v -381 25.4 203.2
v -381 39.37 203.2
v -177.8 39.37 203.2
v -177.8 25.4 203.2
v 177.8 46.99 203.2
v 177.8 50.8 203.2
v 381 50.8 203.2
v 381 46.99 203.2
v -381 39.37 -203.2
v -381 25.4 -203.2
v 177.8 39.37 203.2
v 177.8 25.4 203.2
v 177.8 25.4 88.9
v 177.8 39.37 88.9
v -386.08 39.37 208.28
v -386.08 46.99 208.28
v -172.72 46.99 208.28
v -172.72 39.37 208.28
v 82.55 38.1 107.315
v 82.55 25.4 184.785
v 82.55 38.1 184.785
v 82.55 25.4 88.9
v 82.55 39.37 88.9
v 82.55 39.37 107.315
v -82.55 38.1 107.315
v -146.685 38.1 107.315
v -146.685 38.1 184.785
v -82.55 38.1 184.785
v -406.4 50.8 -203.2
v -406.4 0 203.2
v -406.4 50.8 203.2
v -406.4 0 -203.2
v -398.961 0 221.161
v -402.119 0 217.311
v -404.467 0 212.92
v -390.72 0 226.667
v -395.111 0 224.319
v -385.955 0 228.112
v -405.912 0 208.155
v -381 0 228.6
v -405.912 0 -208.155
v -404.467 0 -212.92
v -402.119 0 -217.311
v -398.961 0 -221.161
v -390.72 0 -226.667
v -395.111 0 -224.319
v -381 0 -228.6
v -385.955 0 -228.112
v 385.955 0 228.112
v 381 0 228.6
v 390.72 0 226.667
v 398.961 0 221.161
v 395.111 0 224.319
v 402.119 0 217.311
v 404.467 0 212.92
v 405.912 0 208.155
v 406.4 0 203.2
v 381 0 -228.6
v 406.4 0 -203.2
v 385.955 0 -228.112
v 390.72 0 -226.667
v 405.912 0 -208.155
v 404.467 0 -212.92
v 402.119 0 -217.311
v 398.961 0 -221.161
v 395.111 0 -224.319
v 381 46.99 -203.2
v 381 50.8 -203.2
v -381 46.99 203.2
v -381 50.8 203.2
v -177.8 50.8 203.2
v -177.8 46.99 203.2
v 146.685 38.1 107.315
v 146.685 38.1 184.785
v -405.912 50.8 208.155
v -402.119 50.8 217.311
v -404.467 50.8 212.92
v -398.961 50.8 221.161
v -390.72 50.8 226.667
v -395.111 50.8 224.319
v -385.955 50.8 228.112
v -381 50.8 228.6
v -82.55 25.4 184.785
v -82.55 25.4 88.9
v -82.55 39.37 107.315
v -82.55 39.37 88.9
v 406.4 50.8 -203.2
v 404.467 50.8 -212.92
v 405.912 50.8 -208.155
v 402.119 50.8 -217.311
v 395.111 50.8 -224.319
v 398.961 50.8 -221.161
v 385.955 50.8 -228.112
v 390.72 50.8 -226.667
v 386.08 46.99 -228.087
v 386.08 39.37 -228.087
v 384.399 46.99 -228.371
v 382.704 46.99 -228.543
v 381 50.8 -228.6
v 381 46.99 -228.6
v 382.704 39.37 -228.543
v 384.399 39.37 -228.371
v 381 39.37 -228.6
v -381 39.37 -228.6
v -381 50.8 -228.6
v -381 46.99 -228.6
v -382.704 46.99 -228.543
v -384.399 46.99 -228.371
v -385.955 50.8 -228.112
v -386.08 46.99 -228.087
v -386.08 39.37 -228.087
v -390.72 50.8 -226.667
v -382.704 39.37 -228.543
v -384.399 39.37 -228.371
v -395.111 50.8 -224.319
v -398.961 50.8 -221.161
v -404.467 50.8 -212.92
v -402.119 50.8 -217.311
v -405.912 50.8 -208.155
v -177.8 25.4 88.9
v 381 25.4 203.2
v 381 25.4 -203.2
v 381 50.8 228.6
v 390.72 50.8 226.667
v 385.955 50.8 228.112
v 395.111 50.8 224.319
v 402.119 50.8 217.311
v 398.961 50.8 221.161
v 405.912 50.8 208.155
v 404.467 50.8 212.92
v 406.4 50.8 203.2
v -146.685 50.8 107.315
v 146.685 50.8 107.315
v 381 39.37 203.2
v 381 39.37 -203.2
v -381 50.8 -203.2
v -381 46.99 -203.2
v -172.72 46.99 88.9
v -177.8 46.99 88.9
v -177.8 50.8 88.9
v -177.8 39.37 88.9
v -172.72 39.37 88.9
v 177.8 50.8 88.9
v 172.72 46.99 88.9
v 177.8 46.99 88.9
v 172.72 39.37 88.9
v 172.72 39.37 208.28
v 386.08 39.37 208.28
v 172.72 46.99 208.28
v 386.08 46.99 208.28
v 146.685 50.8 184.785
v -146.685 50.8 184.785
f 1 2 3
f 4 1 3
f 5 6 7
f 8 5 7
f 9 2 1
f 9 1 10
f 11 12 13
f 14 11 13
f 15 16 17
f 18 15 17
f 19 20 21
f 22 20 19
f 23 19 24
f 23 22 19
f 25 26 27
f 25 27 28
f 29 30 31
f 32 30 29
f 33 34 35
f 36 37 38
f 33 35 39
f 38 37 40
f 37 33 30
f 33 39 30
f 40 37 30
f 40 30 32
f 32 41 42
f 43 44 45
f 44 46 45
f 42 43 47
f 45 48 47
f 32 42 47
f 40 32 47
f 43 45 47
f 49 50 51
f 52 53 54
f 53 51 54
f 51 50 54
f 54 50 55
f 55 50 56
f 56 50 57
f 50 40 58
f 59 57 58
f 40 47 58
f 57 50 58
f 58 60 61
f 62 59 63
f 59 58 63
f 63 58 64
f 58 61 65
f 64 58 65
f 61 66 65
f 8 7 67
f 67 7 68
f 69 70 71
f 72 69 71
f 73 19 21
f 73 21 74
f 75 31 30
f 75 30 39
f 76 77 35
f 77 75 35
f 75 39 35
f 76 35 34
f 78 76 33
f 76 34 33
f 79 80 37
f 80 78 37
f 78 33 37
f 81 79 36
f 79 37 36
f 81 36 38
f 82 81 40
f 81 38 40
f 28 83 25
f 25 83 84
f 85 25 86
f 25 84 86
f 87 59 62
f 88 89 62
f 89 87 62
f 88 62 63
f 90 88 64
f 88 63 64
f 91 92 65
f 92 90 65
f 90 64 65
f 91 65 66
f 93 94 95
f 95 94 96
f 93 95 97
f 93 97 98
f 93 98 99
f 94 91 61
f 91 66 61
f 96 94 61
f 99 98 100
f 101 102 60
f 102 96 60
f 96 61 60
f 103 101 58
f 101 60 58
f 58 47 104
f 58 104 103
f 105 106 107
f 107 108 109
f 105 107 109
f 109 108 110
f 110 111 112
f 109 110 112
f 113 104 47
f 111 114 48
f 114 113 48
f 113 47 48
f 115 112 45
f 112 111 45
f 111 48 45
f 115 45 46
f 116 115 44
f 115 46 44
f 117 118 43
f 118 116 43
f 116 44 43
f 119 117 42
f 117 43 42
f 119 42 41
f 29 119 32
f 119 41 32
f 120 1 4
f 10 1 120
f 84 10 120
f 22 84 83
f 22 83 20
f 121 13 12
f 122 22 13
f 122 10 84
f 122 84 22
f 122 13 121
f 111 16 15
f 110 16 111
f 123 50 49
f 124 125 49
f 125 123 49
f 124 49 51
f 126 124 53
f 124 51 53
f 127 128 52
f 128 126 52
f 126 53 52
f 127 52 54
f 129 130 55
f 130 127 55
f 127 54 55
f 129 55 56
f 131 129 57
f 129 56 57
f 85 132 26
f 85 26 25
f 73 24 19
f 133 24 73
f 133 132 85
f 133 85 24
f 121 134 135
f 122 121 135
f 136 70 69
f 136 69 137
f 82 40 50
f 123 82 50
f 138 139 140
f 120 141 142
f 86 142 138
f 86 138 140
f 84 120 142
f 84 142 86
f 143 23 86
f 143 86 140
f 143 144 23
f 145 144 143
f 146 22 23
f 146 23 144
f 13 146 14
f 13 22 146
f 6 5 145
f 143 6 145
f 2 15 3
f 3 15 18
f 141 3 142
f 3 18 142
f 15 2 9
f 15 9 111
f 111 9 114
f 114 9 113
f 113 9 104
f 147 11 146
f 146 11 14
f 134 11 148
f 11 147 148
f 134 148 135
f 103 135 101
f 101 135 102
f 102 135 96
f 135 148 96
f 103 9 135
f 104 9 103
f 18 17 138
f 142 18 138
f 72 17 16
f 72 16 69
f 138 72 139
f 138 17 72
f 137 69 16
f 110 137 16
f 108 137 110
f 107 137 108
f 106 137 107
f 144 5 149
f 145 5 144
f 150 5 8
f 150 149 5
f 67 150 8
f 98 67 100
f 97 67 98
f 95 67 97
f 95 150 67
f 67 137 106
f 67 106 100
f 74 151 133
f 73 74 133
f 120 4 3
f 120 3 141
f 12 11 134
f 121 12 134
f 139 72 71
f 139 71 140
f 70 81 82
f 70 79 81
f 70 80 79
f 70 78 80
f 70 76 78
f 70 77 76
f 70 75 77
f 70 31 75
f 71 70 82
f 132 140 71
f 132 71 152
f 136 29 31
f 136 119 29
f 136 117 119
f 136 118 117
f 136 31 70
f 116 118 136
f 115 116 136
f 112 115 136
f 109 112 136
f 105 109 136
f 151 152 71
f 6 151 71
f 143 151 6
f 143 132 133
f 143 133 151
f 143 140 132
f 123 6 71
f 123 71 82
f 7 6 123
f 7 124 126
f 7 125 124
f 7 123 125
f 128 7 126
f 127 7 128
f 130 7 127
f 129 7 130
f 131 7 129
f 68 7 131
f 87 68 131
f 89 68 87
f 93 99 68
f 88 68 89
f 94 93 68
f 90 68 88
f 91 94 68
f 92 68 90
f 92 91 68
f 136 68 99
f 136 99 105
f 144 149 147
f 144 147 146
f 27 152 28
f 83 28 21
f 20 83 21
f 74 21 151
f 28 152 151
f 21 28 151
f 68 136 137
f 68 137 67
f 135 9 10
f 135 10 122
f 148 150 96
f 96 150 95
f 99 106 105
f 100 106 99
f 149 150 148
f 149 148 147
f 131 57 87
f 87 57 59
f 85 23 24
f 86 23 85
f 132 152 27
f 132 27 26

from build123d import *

# Parameters (mm, degrees)
SKETCH3_W                       = 812.8
SKETCH3_H                       = 457.2
BOSS_EXTRUDE3_DEPTH             = 50.8
SKETCH7_W                       = 762
SKETCH7_H                       = 406.4
CUT_EXTRUDE1_DEPTH              = 25.4
SKETCH8_W                       = 355.6
SKETCH8_H                       = 114.3
BOSS_EXTRUDE7_DEPTH             = 25.4
SKETCH23_W                      = 431.8
SKETCH23_H                      = 7.62
CUT_EXTRUDE11_DEPTH             = 5.08
SKETCH24_W                      = 762
SKETCH24_H                      = 7.62
CUT_EXTRUDE12_DEPTH             = 81.026
SKETCH26_W                      = 208.28
SKETCH26_H                      = 7.62
CUT_EXTRUDE13_DEPTH             = 5.08
SKETCH28_W                      = 119.38
SKETCH28_H                      = 7.62
CUT_EXTRUDE14_DEPTH             = 5.08
SKETCH30_W                      = 293.37
SKETCH30_H                      = 77.47
CUT_EXTRUDE16_DEPTH             = 12.7
CUT_EXTRUDE19_REACH             = 520.216
SKETCH32_W                      = 165.1
SKETCH32_H                      = 13.97
CUT_EXTRUDE19_DIRECTION_2_DEPTH = 44.45
FILLET1_R                       = 25.4


with BuildPart() as part:
    # Sketch3 → Boss-Extrude3 (new body)
    with BuildSketch(Plane(origin=(0, 0, 0), x_dir=(1, 0, 0), z_dir=(0, 1, 0))):
        Rectangle(SKETCH3_W, SKETCH3_H)
    extrude(amount=BOSS_EXTRUDE3_DEPTH)

    # Sketch7 → Cut-Extrude1 (cut)
    with BuildSketch(Plane(origin=(0, 50.8, 0), x_dir=(1, 0, 0), z_dir=(0, 1, 0))):
        Rectangle(SKETCH7_W, SKETCH7_H)
    extrude(amount=-CUT_EXTRUDE1_DEPTH, mode=Mode.SUBTRACT)

    # Sketch8 → Boss-Extrude7 (add)
    with BuildSketch(Plane(origin=(0, 25.4, 0), x_dir=(1, 0, 0), z_dir=(0, 1, 0))):
        with Locations((0, -146.05)):
            Rectangle(SKETCH8_W, SKETCH8_H)
    extrude(amount=BOSS_EXTRUDE7_DEPTH)

    # Sketch23 → Cut-Extrude11 (cut)
    with BuildSketch(Plane(origin=(-381, 0, 0), x_dir=(0, 0, -1), z_dir=(1, 0, 0))):
        with Locations((12.7, 43.18)):
            Rectangle(SKETCH23_W, SKETCH23_H)
    cut_extrude11 = extrude(amount=-CUT_EXTRUDE11_DEPTH, mode=Mode.SUBTRACT)

    # Mirror3: Cut-Extrude11 across plane
    add(cut_extrude11.mirror(Plane(origin=(0, 0, 0), x_dir=(0, 0, 1), z_dir=(1, 0, 0))), mode=Mode.SUBTRACT)

    # Sketch24 → Cut-Extrude12 (cut)
    with BuildSketch(Plane(origin=(0, 0, -228.6), x_dir=(-1, 0, 0), z_dir=(0, 0, -1))):
        with Locations((0, 43.18)):
            Rectangle(SKETCH24_W, SKETCH24_H)
    extrude(amount=-CUT_EXTRUDE12_DEPTH, mode=Mode.SUBTRACT)

    # Sketch26 → Cut-Extrude13 (cut)
    with BuildSketch(Plane(origin=(0, 0, 203.2), x_dir=(-1, 0, 0), z_dir=(0, 0, -1))):
        with Locations((-281.94, 43.18)):
            Rectangle(SKETCH26_W, SKETCH26_H)
    cut_extrude13 = extrude(amount=-CUT_EXTRUDE13_DEPTH, mode=Mode.SUBTRACT)

    # Mirror4: Cut-Extrude13 across plane
    add(cut_extrude13.mirror(Plane(origin=(0, 0, 0), x_dir=(0, 0, 1), z_dir=(1, 0, 0))), mode=Mode.SUBTRACT)

    # Sketch28 → Cut-Extrude14 (cut)
    with BuildSketch(Plane(origin=(177.8, 0, 0), x_dir=(0, 0, -1), z_dir=(1, 0, 0))):
        with Locations((-148.59, 43.18)):
            Rectangle(SKETCH28_W, SKETCH28_H)
    cut_extrude14 = extrude(amount=-CUT_EXTRUDE14_DEPTH, mode=Mode.SUBTRACT)

    # Mirror5: Cut-Extrude14 across plane
    add(cut_extrude14.mirror(Plane(origin=(0, 0, 0), x_dir=(0, 0, 1), z_dir=(1, 0, 0))), mode=Mode.SUBTRACT)

    # Sketch30 → Cut-Extrude16 (cut)
    with BuildSketch(Plane(origin=(0, 50.8, 0), x_dir=(1, 0, 0), z_dir=(0, 1, 0))):
        with Locations((0, -146.05)):
            Rectangle(SKETCH30_W, SKETCH30_H)
    extrude(amount=-CUT_EXTRUDE16_DEPTH, mode=Mode.SUBTRACT)

    # Cut-Extrude19: up to this face of the body (flat: up to its plane)
    cut_extrude19_end = Plane(part.part.faces().sort_by_distance((0, 44.45, 184.785))[0])
    # Sketch32 → Cut-Extrude19 (cut, up to the picked face)
    with BuildSketch(Plane(origin=(0, 0, 88.9), x_dir=(-1, 0, 0), z_dir=(0, 0, -1)), mode=Mode.PRIVATE) as cut_extrude19_sk1:
        with Locations((0, 32.385)):
            Rectangle(SKETCH32_W, SKETCH32_H)
    cut_extrude19_tool1 = split(extrude(cut_extrude19_sk1.sketch, amount=-CUT_EXTRUDE19_REACH, mode=Mode.PRIVATE), bisect_by=cut_extrude19_end, keep=Keep.BOTH, mode=Mode.PRIVATE)
    add(cut_extrude19_tool1.solids().sort_by(Axis((0, 32.385, 88.9), (0, 0, 1)))[0], mode=Mode.SUBTRACT)

    # Sketch32 → Cut-Extrude19 direction 2 (cut)
    with BuildSketch(Plane(origin=(0, 0, 88.9), x_dir=(-1, 0, 0), z_dir=(0, 0, -1))):
        with Locations((0, 32.385)):
            Rectangle(SKETCH32_W, SKETCH32_H)
    extrude(amount=CUT_EXTRUDE19_DIRECTION_2_DEPTH, mode=Mode.SUBTRACT)

    # Fillet1
    # the kernel refuses this fillet: 25.4 mm, written as the material it takes off along each edge
    with BuildSketch(Plane(origin=(-406.4, -63.5, -228.6), x_dir=(1, 0, 0), z_dir=(0, 1, 0)), Plane(origin=(-406.4, -63.5, 228.6), x_dir=(0, 0, -1), z_dir=(0, 1, 0))) as fillet1_piece_1:
        with BuildLine():
            CenterArc((FILLET1_R, -FILLET1_R), FILLET1_R, 90, 90)
            Line((0, -FILLET1_R), (0, 0))
            Line((0, 0), (FILLET1_R, 0))
        make_face()
    extrude(amount=177.8, mode=Mode.SUBTRACT)
    with BuildSketch(Plane(origin=(406.4, -63.5, -228.6), x_dir=(-1, 0, 0), z_dir=(0, 1, 0)), Plane(origin=(406.4, -63.5, 228.6), x_dir=(0, 0, -1), z_dir=(0, 1, 0))) as fillet1_piece_2:
        with BuildLine():
            CenterArc((FILLET1_R, FILLET1_R), FILLET1_R, 180, 90)
            Line((0, FILLET1_R), (0, 0))
            Line((0, 0), (FILLET1_R, 0))
        make_face()
    extrude(amount=177.8, mode=Mode.SUBTRACT)


solid = part.part
